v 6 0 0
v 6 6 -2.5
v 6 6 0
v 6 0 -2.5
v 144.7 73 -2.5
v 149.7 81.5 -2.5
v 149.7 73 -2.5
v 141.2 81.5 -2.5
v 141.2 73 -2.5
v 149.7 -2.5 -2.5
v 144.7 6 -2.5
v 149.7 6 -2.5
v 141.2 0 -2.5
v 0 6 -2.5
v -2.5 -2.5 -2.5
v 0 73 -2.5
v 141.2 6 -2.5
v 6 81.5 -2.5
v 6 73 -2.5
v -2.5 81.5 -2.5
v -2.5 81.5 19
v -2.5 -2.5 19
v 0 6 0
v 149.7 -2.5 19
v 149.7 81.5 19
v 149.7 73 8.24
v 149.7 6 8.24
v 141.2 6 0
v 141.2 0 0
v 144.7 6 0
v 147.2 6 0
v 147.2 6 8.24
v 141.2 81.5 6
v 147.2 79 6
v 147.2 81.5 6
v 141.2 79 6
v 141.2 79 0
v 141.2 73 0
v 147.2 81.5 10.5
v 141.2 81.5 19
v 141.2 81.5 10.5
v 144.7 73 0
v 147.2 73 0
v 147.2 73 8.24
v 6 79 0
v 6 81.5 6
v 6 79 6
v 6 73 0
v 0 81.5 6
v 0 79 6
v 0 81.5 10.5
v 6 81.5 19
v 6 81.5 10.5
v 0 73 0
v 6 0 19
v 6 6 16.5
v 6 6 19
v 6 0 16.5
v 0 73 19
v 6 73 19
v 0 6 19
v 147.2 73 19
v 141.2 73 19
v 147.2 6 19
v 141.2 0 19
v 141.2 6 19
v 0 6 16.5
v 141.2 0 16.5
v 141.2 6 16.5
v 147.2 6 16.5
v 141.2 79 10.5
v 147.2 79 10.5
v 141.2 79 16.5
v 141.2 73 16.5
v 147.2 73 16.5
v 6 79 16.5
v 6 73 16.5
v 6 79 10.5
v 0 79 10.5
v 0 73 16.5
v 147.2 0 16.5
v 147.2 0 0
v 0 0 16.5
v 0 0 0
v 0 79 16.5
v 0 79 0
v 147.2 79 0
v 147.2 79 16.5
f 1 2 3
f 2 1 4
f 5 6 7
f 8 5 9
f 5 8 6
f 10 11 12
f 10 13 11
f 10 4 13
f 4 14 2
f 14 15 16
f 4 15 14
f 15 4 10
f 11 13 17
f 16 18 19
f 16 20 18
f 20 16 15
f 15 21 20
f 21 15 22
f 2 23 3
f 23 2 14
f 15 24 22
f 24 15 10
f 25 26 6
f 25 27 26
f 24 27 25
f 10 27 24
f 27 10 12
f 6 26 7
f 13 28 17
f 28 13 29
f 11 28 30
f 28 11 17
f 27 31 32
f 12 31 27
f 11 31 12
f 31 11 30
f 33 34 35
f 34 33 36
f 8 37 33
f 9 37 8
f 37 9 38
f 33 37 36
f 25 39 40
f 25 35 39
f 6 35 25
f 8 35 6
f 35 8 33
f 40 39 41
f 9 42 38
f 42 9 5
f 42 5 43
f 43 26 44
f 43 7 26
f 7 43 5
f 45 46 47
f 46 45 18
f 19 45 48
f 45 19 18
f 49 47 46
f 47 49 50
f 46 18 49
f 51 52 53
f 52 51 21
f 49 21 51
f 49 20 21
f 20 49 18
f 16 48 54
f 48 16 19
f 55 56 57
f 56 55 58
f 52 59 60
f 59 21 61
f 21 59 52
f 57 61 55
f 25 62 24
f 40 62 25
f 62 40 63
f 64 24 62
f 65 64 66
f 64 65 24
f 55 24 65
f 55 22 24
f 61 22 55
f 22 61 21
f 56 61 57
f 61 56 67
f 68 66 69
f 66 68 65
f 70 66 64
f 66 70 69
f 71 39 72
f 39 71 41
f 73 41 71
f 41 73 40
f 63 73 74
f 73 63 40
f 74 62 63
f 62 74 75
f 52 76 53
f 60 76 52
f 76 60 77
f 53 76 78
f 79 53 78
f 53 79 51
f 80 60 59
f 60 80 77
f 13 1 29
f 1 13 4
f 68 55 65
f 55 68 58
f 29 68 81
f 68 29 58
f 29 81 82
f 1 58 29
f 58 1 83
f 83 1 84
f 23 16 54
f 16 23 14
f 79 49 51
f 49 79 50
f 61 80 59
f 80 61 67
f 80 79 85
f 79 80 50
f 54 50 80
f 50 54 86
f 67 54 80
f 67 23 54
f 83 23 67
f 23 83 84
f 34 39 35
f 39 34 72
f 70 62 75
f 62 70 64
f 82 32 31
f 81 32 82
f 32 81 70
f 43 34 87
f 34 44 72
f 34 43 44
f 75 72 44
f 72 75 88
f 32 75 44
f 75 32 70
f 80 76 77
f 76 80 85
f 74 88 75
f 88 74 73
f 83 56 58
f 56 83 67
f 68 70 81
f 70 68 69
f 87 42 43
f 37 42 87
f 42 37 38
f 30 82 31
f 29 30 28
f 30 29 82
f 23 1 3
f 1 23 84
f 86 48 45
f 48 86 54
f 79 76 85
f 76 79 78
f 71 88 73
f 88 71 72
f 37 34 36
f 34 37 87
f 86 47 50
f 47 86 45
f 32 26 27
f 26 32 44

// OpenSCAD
monitor_width = 147.2; // actually 146.7 but needs give
monitor_height = 79; // actually 78.5 but needs give
monitor_thickness = 16.5; // actually 16 but needs give

keyboard_width = 152;
keyboard_height = 59;
keyboard_thickness = 12;

thickness = 2.5;
lip = 6;

module monitor() {
	cube([monitor_width, monitor_height, monitor_thickness]);
}

module keyboard() {
	cube([keyboard_width, keyboard_height, keyboard_thickness]);
}

%monitor();

difference() {
	union() {
		positions = [
			[ -thickness,        -thickness,         -thickness            ],
			[ monitor_width-lip, -thickness,         -thickness            ],
			[ monitor_width-lip, monitor_height-lip, -thickness            ],
			[ -thickness,        monitor_height-lip, -thickness            ],
			[ -thickness,        -thickness,         monitor_thickness-lip ],
			[ monitor_width-lip, -thickness,         monitor_thickness-lip ],
			[ monitor_width-lip, monitor_height-lip, monitor_thickness-lip ],
			[ -thickness,        monitor_height-lip, monitor_thickness-lip ],
		];
		for (i = positions) {
			translate(i)
			cube(thickness+lip);
		}

		translate([-thickness, -thickness, -thickness])
			cube([
				monitor_width + thickness * 2,
				thickness,
				monitor_thickness + thickness * 2,
			]);

		translate([-thickness, -thickness, -thickness])
			cube([
				thickness,
				monitor_height + thickness * 2,
				monitor_thickness + thickness * 2,
			]);

		translate([monitor_width, -thickness, -thickness])
			cube([
				thickness,
				monitor_height + thickness * 2,
				monitor_thickness + thickness * 2,
			]);

	}
	monitor();
	translate([monitor_width-thickness, lip, -thickness-0.01])
		cube([10, monitor_height-lip*2, monitor_thickness/2 + thickness]);
}

// keyboard();
